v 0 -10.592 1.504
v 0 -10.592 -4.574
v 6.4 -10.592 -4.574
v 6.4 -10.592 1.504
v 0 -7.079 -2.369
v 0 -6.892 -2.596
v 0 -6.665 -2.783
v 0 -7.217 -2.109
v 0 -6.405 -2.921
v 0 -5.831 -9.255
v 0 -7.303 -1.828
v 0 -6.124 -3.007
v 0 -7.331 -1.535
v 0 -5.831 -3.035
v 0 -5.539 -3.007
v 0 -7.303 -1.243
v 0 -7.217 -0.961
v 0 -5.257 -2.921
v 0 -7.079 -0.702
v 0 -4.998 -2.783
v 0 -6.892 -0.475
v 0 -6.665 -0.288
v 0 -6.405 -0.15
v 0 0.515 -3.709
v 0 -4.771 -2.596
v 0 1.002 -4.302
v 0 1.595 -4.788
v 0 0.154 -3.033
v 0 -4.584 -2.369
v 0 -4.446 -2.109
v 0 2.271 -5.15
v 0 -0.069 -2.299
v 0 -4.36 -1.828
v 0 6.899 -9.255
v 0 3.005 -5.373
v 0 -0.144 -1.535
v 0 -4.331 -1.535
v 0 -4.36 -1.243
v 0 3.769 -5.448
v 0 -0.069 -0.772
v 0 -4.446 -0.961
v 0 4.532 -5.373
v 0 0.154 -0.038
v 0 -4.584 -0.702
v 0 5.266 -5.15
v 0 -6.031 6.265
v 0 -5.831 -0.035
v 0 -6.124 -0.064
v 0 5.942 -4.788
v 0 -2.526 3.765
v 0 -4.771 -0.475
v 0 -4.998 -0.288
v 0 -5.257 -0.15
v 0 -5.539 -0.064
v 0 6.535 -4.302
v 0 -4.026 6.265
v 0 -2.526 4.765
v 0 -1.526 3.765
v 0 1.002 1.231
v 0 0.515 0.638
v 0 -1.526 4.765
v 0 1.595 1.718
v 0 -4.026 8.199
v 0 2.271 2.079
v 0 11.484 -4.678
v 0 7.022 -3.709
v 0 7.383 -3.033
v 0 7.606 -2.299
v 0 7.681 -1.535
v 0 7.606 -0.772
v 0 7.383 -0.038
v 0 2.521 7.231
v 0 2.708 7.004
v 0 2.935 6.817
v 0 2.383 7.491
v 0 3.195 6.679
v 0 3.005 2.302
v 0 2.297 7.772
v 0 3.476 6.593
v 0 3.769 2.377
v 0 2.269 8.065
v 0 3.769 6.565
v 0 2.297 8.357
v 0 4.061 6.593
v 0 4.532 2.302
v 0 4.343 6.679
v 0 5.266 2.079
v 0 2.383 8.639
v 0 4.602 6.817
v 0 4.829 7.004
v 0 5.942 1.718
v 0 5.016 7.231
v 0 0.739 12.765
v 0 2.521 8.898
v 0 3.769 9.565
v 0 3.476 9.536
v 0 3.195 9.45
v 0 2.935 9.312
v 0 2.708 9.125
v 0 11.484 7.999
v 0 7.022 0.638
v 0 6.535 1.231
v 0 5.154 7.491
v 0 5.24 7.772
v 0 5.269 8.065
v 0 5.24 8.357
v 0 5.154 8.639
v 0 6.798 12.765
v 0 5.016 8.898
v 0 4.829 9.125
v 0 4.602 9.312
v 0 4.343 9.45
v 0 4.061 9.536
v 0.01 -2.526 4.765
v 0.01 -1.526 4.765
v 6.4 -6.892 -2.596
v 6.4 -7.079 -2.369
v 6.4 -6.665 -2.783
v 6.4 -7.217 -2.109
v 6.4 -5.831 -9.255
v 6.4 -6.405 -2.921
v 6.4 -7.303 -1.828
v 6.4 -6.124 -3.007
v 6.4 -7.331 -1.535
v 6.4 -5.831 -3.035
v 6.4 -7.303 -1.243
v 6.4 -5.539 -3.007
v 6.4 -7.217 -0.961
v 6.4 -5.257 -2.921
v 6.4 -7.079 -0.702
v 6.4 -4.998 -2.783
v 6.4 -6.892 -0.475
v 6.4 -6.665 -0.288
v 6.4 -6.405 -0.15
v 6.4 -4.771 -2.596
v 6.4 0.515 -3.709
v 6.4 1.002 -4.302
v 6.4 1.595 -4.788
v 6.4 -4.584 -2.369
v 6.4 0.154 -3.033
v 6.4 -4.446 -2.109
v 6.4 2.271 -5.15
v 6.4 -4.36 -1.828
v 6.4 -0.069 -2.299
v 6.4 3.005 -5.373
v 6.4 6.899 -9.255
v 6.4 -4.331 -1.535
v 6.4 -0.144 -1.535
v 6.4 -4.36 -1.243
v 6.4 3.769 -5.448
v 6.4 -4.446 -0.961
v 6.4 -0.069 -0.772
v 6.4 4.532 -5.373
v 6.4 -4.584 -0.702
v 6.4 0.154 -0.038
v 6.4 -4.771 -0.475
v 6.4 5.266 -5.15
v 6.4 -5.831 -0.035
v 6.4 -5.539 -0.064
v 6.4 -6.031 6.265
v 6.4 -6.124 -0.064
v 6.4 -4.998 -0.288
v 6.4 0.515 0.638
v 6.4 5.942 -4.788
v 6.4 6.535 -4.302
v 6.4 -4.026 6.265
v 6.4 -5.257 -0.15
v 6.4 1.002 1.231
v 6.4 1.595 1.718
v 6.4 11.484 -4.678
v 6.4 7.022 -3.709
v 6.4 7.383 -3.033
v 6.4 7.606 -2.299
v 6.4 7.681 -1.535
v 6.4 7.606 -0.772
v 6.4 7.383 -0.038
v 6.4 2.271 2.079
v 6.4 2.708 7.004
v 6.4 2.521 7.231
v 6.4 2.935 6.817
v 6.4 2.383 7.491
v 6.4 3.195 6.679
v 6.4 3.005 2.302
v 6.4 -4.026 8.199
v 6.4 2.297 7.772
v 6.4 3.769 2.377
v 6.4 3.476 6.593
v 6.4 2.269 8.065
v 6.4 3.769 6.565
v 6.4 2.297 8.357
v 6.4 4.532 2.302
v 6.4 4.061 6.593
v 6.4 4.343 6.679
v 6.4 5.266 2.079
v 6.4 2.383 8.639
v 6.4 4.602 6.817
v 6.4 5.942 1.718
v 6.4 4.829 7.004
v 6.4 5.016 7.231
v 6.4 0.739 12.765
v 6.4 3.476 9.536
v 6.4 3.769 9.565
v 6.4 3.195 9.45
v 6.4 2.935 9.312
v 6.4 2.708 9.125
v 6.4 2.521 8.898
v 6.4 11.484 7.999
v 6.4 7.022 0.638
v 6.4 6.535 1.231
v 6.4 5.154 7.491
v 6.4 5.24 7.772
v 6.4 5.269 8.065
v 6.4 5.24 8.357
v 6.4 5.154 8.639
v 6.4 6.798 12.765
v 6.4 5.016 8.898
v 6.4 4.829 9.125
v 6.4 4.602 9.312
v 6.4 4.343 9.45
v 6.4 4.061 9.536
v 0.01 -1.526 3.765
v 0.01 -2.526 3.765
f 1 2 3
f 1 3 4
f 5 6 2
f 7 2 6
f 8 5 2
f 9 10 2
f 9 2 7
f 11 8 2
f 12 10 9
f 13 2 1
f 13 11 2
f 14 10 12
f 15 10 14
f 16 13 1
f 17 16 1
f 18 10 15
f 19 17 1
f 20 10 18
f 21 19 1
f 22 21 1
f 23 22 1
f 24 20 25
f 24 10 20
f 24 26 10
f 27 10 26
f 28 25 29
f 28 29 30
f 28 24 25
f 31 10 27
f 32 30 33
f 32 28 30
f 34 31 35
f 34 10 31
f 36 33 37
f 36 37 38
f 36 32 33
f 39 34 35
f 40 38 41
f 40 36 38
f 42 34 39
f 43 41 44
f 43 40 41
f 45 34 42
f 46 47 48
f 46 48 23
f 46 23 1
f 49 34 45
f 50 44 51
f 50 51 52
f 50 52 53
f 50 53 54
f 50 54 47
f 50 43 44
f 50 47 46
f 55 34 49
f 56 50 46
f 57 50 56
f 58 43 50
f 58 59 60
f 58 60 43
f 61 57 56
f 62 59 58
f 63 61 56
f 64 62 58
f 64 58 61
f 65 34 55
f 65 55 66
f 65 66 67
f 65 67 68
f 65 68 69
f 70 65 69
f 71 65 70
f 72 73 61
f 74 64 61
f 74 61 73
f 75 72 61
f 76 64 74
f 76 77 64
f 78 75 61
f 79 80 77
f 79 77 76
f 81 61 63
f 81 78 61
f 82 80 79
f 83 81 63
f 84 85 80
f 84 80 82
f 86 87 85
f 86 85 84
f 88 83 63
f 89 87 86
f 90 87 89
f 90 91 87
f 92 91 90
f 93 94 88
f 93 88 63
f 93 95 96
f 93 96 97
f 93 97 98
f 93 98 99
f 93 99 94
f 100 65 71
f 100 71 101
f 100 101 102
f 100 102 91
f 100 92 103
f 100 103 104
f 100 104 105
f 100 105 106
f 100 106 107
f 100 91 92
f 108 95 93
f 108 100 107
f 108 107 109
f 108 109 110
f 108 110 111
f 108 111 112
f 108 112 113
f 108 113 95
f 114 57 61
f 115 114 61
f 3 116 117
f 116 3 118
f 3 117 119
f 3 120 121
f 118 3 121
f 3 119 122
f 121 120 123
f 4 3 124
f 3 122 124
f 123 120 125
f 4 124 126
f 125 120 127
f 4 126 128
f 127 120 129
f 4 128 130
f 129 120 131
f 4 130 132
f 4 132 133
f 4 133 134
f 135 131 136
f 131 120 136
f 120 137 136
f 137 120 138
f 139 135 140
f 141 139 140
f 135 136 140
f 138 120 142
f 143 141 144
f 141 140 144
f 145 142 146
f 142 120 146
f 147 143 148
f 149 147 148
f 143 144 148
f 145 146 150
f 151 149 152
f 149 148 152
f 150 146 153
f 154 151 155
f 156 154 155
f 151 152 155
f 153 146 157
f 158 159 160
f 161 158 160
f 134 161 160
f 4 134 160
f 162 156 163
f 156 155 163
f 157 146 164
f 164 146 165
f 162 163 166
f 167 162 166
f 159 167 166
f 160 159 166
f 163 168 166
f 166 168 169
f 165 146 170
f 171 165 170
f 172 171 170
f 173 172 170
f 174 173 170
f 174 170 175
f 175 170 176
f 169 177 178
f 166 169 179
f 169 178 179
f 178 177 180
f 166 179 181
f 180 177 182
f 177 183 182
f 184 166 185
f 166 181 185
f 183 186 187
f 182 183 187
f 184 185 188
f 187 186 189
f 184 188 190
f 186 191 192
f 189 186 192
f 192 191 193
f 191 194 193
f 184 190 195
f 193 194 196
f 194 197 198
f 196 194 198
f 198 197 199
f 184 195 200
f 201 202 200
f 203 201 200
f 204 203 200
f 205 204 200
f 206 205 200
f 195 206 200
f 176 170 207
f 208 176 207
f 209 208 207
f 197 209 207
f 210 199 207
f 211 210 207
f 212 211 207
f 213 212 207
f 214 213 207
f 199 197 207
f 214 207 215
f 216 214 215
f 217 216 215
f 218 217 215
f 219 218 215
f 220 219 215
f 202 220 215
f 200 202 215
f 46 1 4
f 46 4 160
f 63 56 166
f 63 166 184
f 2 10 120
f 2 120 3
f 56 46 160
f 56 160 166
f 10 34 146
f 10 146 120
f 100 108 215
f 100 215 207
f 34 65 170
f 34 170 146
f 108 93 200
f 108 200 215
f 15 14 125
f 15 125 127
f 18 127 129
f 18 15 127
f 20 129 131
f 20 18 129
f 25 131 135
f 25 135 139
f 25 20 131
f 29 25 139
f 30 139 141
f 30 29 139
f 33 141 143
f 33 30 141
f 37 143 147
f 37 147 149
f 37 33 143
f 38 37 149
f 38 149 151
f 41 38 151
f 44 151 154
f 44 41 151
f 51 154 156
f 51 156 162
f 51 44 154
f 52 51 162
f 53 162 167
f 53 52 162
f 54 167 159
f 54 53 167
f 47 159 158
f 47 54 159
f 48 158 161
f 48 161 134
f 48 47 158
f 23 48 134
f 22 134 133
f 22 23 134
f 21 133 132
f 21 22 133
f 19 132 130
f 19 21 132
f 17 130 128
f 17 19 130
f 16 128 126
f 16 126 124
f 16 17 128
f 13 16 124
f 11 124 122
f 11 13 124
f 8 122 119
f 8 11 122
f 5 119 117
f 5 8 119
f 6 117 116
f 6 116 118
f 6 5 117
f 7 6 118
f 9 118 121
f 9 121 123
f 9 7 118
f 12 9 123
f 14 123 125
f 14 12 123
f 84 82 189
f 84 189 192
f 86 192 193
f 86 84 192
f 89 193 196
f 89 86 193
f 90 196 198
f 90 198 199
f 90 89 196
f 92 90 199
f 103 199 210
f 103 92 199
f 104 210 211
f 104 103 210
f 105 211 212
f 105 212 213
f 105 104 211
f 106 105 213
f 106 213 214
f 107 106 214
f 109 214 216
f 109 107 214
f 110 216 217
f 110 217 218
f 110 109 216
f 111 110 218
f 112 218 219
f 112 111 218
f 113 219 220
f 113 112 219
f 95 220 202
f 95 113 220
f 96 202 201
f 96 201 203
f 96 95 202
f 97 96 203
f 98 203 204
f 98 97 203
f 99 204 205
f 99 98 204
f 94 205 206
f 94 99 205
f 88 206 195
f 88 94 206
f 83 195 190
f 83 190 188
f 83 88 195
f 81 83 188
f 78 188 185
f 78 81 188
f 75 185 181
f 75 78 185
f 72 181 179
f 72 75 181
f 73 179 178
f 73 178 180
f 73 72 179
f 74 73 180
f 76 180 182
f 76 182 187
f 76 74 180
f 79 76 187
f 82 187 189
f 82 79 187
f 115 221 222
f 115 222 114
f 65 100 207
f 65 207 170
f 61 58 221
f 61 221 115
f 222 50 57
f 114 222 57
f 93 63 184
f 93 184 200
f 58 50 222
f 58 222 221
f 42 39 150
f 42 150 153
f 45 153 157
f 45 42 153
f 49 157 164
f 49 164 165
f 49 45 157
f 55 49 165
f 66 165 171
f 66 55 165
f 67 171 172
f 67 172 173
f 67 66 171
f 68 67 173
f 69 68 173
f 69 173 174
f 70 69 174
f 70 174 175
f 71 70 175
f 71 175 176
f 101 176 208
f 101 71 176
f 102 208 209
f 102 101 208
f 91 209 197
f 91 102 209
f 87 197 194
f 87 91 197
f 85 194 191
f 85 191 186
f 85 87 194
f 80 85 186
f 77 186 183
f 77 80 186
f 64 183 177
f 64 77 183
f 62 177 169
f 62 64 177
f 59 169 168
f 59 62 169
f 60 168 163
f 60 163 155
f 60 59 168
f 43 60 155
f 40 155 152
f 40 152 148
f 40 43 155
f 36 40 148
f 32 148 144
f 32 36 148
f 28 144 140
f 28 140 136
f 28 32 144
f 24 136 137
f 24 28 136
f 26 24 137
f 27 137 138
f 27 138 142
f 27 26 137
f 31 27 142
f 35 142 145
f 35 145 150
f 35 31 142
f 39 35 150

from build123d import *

# Parameters (mm, degrees)
SKETCH1_R           = 3.9125
SKETCH1_R_2         = 1.5
BOSS_EXTRUDE1_DEPTH = 6.4
SKETCH2_W           = 1
SKETCH2_H           = 1
CUT_EXTRUDE1_DEPTH  = 0.01


with BuildPart() as part:
    # Sketch1 → Boss-Extrude1 (new body)
    with BuildSketch(Plane(origin=(0, 0, 0), x_dir=(0, 0, -1), z_dir=(1, 0, 0))):
        Polygon((9.255332298, -5.831457087), (4.574493559, -10.592295826), (-1.503828964, -10.592295826), (-6.264667702, -6.031457087), (-6.264667702, -4.026426966), (-8.199461444, -4.026426966), (-12.764667702, 0.738779293), (-12.764667702, 6.798306532), (-7.999461444, 11.483512791), (4.678092816, 11.483512791), (9.255332298, 6.898567055), align=None)
        with Locations((1.535332298, 3.768542913)):
            Circle(SKETCH1_R, mode=Mode.SUBTRACT)
        with Locations((-8.064667702, 3.768542913)):
            Circle(SKETCH1_R_2, mode=Mode.SUBTRACT)
        with Locations((1.535332298, -5.831457087)):
            Circle(SKETCH1_R_2, mode=Mode.SUBTRACT)
    extrude(amount=BOSS_EXTRUDE1_DEPTH)

    # Sketch2 → Cut-Extrude1 (cut)
    with BuildSketch(Plane.ZY):
        with Locations((4.264667702, -2.026426966)):
            Rectangle(SKETCH2_W, SKETCH2_H)
    extrude(amount=-CUT_EXTRUDE1_DEPTH, mode=Mode.SUBTRACT)


solid = part.part
